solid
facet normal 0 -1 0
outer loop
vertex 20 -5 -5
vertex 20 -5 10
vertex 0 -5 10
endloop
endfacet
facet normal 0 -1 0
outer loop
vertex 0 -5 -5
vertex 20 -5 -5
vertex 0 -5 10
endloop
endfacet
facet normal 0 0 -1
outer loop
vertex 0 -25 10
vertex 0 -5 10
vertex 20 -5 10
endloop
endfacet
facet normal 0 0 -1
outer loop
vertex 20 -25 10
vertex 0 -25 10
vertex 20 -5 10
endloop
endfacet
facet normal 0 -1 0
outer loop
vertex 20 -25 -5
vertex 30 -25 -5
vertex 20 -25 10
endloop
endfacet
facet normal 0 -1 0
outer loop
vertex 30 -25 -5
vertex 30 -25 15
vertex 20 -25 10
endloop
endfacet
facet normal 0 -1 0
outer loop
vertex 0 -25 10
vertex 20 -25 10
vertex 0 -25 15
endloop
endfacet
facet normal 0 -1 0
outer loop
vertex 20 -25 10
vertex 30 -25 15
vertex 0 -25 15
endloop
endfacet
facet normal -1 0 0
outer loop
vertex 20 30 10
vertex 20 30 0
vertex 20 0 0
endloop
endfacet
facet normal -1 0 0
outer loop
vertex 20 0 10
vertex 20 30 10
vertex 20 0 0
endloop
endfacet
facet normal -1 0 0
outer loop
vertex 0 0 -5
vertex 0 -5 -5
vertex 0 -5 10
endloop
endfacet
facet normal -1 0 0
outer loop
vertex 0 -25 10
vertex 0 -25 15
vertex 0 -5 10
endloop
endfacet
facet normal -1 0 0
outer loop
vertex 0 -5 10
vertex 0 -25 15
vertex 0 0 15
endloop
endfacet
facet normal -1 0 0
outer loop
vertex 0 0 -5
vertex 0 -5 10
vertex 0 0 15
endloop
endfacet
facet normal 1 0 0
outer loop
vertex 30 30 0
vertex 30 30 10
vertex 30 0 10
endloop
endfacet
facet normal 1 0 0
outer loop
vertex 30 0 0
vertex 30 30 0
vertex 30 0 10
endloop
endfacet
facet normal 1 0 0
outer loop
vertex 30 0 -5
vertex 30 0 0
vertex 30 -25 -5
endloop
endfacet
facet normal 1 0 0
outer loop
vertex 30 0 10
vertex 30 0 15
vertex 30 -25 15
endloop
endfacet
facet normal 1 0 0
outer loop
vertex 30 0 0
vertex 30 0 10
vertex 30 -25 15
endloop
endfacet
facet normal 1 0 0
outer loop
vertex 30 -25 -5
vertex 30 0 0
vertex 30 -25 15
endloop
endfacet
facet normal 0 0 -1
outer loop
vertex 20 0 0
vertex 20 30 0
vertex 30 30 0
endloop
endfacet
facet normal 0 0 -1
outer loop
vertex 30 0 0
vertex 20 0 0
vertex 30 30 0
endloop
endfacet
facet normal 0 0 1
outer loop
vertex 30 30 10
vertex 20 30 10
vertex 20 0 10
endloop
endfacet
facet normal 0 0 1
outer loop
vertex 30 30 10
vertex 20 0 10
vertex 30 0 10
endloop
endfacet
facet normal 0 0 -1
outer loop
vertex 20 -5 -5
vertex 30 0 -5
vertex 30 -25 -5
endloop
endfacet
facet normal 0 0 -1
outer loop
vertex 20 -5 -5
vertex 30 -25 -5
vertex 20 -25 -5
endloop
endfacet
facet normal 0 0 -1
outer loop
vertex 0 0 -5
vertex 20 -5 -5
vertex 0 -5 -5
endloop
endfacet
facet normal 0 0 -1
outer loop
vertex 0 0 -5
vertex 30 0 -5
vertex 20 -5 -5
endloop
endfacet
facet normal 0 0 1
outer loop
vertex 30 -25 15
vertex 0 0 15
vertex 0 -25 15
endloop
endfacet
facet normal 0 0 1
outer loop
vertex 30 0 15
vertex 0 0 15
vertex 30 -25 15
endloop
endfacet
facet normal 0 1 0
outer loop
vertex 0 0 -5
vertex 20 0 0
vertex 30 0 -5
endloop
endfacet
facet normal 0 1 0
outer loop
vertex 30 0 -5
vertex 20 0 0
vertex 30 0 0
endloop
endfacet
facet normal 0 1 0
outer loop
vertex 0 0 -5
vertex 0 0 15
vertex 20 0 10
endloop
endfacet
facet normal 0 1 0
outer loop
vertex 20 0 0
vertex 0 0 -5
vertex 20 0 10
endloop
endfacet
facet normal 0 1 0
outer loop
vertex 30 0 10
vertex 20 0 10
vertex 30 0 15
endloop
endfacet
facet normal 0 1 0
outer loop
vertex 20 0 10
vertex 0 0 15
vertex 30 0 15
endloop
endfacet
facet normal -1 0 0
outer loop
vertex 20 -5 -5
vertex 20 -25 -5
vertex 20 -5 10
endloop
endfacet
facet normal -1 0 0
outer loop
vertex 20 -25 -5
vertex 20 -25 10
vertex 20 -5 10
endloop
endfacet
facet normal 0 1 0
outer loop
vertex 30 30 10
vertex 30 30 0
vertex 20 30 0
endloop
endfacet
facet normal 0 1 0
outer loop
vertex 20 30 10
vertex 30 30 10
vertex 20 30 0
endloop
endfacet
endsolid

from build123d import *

# Parameters (mm, degrees)
BOSS_EXTRUDE3_DEPTH = 10
SKETCH5_W           = 30
SKETCH5_H           = 25
BOSS_EXTRUDE5_DEPTH = 5
BOSS_EXTRUDE7_DEPTH = 5


with BuildPart() as part:
    # Sketch3 → Boss-Extrude3 (new body)
    with BuildSketch(Plane.XY):
        Polygon((0, 0), (0, -5), (20, -5), (20, -25), (30, -25), (30, 30), (20, 30), (20, 0), align=None)
    extrude(amount=BOSS_EXTRUDE3_DEPTH)

    # Sketch5 → Boss-Extrude5 (add)
    with BuildSketch(Plane.XY.offset(10)):
        with Locations((15, -12.5)):
            Rectangle(SKETCH5_W, SKETCH5_H)
    extrude(amount=BOSS_EXTRUDE5_DEPTH)

    # Sketch7 → Boss-Extrude7 (add)
    with BuildSketch(Plane(origin=(0, 0, 0), x_dir=(-1, 0, 0), z_dir=(0, 0, -1))):
        Polygon((0, 0), (-20, 0), (-20.758888401, 0), (-30, 0), (-30, -25), (-20, -25), (-20, -5), (0, -5), align=None)
    extrude(amount=BOSS_EXTRUDE7_DEPTH)


solid = part.part
